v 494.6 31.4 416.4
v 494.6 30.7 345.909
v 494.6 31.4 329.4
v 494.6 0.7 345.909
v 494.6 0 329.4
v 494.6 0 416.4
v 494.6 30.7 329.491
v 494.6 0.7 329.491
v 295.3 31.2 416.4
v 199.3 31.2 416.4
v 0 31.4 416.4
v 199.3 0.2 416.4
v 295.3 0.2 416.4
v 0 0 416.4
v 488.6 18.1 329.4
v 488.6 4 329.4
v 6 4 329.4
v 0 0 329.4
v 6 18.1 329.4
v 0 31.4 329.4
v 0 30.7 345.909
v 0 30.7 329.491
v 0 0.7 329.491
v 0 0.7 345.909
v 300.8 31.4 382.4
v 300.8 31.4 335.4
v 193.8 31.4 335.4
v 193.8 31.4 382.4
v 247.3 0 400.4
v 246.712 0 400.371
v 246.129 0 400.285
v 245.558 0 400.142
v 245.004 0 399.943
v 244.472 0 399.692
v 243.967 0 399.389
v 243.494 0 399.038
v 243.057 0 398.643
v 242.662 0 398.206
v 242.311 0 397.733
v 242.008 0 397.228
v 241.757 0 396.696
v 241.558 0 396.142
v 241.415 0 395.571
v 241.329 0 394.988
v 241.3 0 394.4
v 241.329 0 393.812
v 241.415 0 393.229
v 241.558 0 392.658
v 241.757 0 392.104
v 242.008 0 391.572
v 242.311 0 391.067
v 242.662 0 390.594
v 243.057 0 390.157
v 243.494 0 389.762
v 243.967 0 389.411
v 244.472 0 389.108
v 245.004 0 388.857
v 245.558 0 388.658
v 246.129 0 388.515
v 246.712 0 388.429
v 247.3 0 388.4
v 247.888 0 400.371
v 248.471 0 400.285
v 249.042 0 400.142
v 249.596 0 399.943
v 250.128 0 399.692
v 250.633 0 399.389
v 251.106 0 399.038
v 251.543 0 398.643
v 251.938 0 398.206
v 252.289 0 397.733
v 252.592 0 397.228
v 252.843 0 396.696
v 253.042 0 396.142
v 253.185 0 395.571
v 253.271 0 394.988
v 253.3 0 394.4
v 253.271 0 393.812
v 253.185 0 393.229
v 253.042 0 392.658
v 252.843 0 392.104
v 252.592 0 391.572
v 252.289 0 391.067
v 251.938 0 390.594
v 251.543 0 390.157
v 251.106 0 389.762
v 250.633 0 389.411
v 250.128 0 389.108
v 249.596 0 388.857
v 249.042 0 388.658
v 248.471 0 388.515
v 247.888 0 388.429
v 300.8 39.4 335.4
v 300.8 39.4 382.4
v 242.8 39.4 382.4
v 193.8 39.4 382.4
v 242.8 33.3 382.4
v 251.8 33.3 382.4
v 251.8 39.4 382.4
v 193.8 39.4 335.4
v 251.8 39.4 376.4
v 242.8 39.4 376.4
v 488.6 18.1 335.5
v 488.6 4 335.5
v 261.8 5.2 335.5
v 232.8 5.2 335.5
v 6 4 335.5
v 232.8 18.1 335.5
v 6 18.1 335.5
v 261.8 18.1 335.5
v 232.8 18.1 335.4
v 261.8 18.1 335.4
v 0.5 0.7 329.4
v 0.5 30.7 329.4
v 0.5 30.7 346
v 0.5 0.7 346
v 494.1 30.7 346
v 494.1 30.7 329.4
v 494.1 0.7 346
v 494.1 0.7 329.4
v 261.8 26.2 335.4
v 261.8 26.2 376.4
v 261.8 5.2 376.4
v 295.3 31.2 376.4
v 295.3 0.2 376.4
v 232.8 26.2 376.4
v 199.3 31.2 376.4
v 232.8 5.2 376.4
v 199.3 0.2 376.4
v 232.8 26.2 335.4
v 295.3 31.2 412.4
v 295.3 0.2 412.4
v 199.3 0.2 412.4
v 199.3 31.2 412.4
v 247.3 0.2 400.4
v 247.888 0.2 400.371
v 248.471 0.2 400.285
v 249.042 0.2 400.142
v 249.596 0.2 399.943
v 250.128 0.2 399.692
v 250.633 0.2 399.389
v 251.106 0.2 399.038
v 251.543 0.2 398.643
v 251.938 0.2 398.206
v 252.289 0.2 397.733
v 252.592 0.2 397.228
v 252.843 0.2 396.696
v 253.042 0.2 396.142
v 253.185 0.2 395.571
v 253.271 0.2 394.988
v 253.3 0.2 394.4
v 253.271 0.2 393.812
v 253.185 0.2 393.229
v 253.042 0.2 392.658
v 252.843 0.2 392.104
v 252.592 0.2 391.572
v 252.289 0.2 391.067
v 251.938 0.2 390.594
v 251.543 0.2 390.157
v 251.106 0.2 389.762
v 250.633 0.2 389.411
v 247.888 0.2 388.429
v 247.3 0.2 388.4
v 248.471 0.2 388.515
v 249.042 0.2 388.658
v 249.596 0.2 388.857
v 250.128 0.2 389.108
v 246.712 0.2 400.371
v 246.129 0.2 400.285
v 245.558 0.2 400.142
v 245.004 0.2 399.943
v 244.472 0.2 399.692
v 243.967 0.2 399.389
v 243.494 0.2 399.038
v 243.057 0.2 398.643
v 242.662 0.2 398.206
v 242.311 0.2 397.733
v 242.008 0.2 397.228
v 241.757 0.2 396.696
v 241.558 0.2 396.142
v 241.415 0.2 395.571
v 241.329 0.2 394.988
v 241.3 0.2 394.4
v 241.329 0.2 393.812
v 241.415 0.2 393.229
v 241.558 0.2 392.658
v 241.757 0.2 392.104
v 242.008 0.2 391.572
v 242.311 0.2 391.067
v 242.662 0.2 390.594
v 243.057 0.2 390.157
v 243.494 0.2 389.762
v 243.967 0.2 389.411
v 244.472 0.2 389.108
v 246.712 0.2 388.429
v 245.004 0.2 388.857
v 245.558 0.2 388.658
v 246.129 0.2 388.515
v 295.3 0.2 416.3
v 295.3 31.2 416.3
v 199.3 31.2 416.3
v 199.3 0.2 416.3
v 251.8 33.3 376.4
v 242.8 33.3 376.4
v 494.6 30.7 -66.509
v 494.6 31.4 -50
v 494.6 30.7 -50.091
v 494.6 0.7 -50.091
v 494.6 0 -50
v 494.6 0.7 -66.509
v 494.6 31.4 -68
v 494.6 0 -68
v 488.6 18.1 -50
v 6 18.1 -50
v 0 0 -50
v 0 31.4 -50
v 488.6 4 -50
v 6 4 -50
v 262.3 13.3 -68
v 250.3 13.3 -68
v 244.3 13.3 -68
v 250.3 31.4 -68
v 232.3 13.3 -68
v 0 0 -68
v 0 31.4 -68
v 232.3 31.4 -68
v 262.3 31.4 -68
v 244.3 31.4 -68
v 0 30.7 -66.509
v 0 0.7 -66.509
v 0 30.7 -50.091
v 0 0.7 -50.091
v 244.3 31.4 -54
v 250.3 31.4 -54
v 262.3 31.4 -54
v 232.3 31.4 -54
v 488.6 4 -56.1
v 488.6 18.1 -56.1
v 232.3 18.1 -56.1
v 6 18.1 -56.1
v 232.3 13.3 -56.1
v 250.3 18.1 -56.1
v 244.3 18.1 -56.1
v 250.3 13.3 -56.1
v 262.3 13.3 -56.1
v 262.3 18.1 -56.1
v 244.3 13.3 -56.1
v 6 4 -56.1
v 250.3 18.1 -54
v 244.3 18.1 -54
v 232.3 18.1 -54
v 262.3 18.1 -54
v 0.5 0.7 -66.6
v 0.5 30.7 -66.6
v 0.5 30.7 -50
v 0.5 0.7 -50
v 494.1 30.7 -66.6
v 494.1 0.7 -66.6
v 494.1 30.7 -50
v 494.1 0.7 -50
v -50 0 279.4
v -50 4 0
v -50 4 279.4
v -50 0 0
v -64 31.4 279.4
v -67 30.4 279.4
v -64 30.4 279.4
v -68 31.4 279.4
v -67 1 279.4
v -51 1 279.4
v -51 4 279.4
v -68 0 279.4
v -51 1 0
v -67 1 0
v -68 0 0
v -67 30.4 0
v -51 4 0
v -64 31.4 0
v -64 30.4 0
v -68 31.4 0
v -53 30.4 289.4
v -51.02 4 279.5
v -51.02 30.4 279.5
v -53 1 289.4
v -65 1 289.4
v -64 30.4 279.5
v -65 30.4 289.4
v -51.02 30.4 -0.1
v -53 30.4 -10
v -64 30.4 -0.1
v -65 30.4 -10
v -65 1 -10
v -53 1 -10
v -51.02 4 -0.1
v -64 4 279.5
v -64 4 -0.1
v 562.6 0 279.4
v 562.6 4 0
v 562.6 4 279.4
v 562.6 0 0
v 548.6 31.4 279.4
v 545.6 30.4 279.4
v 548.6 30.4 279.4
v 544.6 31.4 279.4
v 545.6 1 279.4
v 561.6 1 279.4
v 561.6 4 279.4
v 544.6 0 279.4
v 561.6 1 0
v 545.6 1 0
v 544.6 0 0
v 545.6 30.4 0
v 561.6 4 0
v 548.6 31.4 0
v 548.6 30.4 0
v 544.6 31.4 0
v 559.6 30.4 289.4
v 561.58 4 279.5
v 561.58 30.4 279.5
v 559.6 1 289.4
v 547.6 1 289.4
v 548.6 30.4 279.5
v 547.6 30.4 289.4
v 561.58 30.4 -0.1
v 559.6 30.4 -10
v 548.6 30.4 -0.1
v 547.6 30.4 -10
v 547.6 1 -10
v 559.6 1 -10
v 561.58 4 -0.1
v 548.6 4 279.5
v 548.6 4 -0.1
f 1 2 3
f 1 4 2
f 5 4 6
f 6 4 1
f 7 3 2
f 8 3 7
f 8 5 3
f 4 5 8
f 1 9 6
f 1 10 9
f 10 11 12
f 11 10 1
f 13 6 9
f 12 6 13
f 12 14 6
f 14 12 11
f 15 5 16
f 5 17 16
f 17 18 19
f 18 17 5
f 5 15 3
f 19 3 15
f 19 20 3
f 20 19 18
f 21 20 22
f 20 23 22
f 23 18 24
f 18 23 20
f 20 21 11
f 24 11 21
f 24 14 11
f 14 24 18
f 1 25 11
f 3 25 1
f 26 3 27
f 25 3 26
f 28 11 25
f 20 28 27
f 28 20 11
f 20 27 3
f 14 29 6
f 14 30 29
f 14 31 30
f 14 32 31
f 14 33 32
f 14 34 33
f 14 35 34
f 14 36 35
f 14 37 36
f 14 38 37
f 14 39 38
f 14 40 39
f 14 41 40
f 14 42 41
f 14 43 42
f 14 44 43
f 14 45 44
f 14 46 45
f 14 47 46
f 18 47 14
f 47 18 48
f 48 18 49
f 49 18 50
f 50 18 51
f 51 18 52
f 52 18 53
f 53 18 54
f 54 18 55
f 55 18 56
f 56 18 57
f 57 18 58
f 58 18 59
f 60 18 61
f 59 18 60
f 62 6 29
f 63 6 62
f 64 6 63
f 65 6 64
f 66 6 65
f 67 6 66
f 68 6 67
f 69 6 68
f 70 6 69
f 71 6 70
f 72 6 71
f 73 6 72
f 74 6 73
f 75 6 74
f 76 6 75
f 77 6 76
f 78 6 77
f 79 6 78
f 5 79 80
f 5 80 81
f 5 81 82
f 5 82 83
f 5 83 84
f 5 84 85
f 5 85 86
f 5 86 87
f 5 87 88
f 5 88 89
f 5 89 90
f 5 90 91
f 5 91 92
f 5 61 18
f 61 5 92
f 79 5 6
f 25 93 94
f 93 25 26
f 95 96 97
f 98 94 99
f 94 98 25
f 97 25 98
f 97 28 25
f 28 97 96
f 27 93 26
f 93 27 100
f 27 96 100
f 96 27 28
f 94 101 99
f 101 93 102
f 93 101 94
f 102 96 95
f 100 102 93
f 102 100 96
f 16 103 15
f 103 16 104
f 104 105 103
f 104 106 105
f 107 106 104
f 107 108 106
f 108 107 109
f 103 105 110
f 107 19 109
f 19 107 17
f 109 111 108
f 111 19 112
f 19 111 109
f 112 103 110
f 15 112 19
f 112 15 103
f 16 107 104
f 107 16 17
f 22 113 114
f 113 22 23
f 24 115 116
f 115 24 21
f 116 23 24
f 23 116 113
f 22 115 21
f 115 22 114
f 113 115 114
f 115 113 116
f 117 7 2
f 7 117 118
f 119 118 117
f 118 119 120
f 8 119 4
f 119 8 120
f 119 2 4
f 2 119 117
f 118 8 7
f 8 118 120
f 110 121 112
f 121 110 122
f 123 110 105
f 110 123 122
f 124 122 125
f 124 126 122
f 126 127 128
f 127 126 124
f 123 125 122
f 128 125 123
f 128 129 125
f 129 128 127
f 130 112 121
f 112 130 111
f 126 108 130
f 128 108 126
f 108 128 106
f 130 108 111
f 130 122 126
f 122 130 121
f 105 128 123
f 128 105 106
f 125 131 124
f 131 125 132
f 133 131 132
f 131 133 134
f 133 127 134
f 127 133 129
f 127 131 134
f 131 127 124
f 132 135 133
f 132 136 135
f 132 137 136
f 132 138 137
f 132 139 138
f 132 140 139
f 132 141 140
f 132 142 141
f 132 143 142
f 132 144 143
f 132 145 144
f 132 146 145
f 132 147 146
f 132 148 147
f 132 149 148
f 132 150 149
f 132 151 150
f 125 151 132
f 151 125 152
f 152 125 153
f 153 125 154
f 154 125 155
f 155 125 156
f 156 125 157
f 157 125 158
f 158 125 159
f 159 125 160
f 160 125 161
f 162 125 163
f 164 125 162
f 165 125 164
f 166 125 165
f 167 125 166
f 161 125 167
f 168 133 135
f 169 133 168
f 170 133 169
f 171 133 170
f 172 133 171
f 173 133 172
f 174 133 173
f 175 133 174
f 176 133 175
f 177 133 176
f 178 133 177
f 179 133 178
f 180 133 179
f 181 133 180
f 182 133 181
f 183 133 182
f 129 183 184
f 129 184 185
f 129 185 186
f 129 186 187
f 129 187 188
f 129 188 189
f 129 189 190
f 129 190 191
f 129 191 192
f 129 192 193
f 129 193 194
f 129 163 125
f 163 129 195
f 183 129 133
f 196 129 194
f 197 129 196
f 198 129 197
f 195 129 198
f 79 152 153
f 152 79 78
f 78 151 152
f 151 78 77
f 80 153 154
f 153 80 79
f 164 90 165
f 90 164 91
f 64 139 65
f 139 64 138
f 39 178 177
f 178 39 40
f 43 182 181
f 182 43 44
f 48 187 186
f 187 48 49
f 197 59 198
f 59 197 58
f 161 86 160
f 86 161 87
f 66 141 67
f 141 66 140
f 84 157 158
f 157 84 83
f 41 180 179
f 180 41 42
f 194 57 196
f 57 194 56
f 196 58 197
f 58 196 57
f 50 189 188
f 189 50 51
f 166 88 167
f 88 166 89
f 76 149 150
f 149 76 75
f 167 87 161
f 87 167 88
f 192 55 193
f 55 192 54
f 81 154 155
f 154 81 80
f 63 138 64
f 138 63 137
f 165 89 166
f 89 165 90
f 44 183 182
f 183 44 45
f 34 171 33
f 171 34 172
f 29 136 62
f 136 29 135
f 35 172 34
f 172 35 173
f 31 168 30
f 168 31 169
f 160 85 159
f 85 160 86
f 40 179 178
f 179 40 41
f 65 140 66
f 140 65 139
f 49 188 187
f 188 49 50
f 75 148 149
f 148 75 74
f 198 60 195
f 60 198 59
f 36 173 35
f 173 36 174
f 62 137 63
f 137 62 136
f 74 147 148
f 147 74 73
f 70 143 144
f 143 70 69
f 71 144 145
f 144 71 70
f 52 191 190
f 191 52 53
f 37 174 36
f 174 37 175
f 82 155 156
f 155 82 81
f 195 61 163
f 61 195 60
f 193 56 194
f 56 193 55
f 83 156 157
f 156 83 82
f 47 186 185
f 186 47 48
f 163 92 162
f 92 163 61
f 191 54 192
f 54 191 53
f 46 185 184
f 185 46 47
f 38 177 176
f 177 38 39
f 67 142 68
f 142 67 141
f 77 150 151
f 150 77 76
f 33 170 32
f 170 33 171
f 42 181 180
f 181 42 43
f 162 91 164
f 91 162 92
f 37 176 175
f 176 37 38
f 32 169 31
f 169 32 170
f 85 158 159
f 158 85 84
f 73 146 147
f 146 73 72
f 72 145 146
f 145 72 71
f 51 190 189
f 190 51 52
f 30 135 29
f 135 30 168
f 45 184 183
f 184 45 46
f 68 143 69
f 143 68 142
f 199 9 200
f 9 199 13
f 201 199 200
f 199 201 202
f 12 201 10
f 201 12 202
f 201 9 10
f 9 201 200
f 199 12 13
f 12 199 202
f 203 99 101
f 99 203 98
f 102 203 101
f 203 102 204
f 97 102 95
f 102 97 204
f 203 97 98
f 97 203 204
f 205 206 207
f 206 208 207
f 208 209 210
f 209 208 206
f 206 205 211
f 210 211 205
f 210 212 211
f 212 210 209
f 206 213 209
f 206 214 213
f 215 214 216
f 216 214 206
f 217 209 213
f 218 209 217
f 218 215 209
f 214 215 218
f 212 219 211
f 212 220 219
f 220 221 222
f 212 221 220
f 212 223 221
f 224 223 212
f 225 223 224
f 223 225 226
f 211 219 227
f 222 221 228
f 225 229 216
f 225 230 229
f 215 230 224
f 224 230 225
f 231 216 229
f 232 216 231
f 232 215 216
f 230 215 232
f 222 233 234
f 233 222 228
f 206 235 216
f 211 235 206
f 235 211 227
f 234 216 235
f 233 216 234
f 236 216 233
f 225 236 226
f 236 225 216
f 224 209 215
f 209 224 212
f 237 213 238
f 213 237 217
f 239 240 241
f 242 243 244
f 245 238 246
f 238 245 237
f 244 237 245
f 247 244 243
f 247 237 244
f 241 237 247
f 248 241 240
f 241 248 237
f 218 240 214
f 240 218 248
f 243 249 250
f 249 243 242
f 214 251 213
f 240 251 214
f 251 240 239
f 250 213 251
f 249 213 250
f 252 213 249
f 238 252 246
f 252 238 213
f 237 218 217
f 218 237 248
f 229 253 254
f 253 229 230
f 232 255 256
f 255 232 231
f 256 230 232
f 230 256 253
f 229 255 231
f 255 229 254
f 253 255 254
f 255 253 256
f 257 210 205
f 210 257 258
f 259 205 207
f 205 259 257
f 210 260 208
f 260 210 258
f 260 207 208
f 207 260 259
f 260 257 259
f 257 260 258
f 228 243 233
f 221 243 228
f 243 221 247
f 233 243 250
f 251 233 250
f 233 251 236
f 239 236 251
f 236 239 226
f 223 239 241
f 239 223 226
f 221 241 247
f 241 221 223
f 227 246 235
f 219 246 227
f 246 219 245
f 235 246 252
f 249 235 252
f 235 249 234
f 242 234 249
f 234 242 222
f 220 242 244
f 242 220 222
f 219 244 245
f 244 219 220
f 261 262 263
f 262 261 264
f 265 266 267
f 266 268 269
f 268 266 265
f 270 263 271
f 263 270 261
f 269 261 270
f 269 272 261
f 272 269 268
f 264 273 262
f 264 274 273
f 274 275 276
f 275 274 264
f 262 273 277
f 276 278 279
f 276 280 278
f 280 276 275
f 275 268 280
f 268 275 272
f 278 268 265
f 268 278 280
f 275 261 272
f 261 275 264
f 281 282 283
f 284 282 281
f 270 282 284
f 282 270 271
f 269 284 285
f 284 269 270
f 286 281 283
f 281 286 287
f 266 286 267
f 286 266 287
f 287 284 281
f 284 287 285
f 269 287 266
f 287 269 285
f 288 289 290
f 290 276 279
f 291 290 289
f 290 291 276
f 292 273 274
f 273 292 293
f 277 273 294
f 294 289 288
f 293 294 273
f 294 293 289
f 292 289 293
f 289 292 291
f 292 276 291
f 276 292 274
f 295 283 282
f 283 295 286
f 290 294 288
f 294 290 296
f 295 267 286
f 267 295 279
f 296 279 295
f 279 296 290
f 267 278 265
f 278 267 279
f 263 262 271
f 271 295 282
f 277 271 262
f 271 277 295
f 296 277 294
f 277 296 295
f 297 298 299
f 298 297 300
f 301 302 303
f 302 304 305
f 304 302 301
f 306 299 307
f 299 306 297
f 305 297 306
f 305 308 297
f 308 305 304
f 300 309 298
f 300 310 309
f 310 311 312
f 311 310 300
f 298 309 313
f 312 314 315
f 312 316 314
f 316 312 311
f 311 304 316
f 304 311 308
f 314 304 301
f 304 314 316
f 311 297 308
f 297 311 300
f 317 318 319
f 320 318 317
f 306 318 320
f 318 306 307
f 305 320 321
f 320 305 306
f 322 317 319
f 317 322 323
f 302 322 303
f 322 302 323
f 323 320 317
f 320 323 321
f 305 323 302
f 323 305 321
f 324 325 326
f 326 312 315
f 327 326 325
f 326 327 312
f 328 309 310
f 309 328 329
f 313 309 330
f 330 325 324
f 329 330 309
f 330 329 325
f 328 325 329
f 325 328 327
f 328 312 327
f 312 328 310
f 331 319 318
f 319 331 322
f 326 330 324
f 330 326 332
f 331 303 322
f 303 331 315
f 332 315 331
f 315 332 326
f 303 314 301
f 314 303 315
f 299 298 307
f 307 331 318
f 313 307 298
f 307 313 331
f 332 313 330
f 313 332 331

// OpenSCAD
// ============================================================
//  SMART MIRROR FRAME  –  4-piece snap-together  (LANDSCAPE)
//
//  Monitor : 19" x 11" x 1"
//    MON_W = 482.6 mm  (long/width side, X axis)  ← was MON_H
//    MON_H = 279.4 mm  (short/height side, Z axis) ← was MON_W
//    MON_D =  25.4 mm  (depth, Y axis)
//
//  Landscape layout:
//    TOP & BOTTOM rails = LONG  (span MON_W + 2*WALL in X)
//    LEFT & RIGHT rails = SHORT (span MON_H in Z)
//
//  ── SNAP JOINT DESIGN ────────────────────────────────────────
//
//  Dovetail tabs on side rails protrude in ±Z.
//  Long rails (top/bottom) receive sockets cut into their X end faces.
//  Same joint geometry as portrait version — just longer rails.
//
//  ── CAMERA : Logitech Brio 105 / C505 (1080p USB) ───────────
//
//  Physical measurements (from product images):
//    Body  : ~95 mm wide × ~35 mm tall × ~30 mm deep
//            (horizontal pill-shaped housing)
//    Clip  : ~28 mm wide × ~40 mm tall
//    Lens aperture : ~10 mm diameter
//
//  Embedded in TOP long rail, centred horizontally.
//  Lens faces front (Y=0). Cable exits rear of bump-out.
//
//  ── WIRE MANAGEMENT ─────────────────────────────────────────
//
//  TOP rail:    camera USB cable channel through bump-out back wall
//  BOTTOM rail: monitor power + video cable channel (rear of rail)
//               sized for 2× cables side by side (HDMI + power)
//
//  PARTS:
//    "top"    long top rail with embedded Logitech camera
//    "bottom" long bottom rail with rear cable channel
//    "left"   short side rail (print 2)
//    "right"  alias for left
//    "all"    exploded view
// ============================================================

PART = "all";

// ----------------------------------------------------------
//  MONITOR  (landscape orientation)
// ----------------------------------------------------------
MON_W = 482.6;   // long dimension → now the horizontal width
MON_H = 279.4;   // short dimension → now the vertical height
MON_D =  25.4;

// ----------------------------------------------------------
//  FRAME PROFILE
// ----------------------------------------------------------
WALL   =  6;
LIP    =  8;
REVEAL =  4;
DEPTH  = MON_D + WALL;    // ≈ 31.4 mm

// ----------------------------------------------------------
//  DOVETAIL
// ----------------------------------------------------------
TAB_W  = 16;
TAB_H  = 10;
TAB_T  = DEPTH - 2;       // ≈ 29.4 mm
DRAFT  =  2;
CLEAR  =  0.3;

// ----------------------------------------------------------
//  CAMERA  (Logitech 1080p – landscape body)
//
//  The camera sits horizontally in the top rail.
//  Body is a horizontal pill: wide in X, shallow in Z.
//    CAM_BL = body length (X) = 95 mm
//    CAM_BW = body width  (Y, front-to-back) = 30 mm
//    CAM_BH = body height (Z) = 35 mm
//  Clip sits below the body (toward monitor):
//    CAM_CL = clip width (X) = 28 mm
//    CAM_CW = clip width (Y) = 20 mm
//    CAM_CH = clip height (Z) = 40 mm
// ----------------------------------------------------------
CAM_BL  = 95.0;    // body X (wide axis)
CAM_BW  = 30.0;    // body Y (depth into rail)
CAM_BH  = 35.0;    // body Z (height)
CAM_CL  = 28.0;    // clip/stand X
CAM_CW  = 20.0;    // clip/stand Y
CAM_CH  = 40.0;    // clip/stand Z (hangs down below body)
CAM_CLR =  0.5;    // pocket clearance all around
LENS_D  = 12.0;    // lens aperture diameter
USB_W   =  9.0;    // USB-A cable cross section (square approx)

// ----------------------------------------------------------
//  WIRE MANAGEMENT (bottom rail)
//
//  Two channels side by side on the rear face of the bottom
//  rail for monitor power + video cable routing.
//  Channels are open slots cut into the rear top edge.
// ----------------------------------------------------------
WIRE_W  = 12.0;    // individual channel width (fits HDMI + power)
WIRE_H  = 14.0;    // channel height
WIRE_SEP = 6.0;    // gap between the two channels

// ----------------------------------------------------------
//  RAIL HEIGHTS
// ----------------------------------------------------------
SHORT_H    = WALL + LIP + REVEAL;                 // 18 mm  (side rails)
TOP_RAIL_H = CAM_CH + CAM_BH + 2*WALL;           // clip below + body + walls
                                                   // = 40+35+12 = 87 mm

// Bump-out (rear protrusion to fully enclose camera body)
BUMP_D = 8;
BUMP_W = CAM_BL + 2*WALL;
BUMP_H = CAM_BH + 2*WALL;

// ============================================================
//  dovetail_tab
// ============================================================
module dovetail_tab() {
    linear_extrude(TAB_T, center=true)
    polygon([
        [ 0,      -(TAB_W/2)       ],
        [ 0,       (TAB_W/2)       ],
        [ TAB_H,   (TAB_W/2-DRAFT) ],
        [ TAB_H,  -(TAB_W/2-DRAFT) ]
    ]);
}

// ============================================================
//  dovetail_socket
// ============================================================
module dovetail_socket() {
    c = CLEAR;
    linear_extrude(TAB_T + 2*c, center=true)
    polygon([
        [-0.5,       -(TAB_W/2 + c)        ],
        [-0.5,        (TAB_W/2 + c)        ],
        [ TAB_H+0.5,  (TAB_W/2-DRAFT + c)  ],
        [ TAB_H+0.5, -(TAB_W/2-DRAFT + c)  ]
    ]);
}

// ============================================================
//  TOP RAIL  (long, camera embedded, USB cable channel)
//
//  X = 0 … MON_W + 2*WALL  (long axis, ~494.6 mm)
//  Y = 0 (front) … DEPTH (rear)
//  Z = 0 (bottom/inner) … TOP_RAIL_H (top/outer)
//
//  Camera centred at X = L/2.
//  Camera clip pocket starts at Z=WALL (above monitor slot wall).
//  Camera body pocket sits on top of clip pocket.
//  Lens port cut through front face (Y=0).
//  Bump-out extends rearward from Y=DEPTH for BUMP_D.
//  USB cable channel exits through bump-out back wall, centred on camera.
// ============================================================
module top_rail() {
    L      = MON_W + 2*WALL;
    sock_z = TAB_W/2 + CLEAR;   // 8.3 mm — socket centre from bottom

    cx = L / 2;   // camera centre X

    // Clip pocket (lower, narrower)
    cl_x0 = cx - (CAM_CL + 2*CAM_CLR) / 2;
    cl_y0 = (DEPTH - (CAM_CW + 2*CAM_CLR)) / 2;
    cl_z0 = WALL;

    // Body pocket (upper, wider, sits on top of clip)
    bo_x0 = cx - (CAM_BL + 2*CAM_CLR) / 2;
    bo_y0 = (DEPTH - (CAM_BW + 2*CAM_CLR)) / 2;
    bo_z0 = cl_z0 + CAM_CH + 2*CAM_CLR;

    // Lens port Z centre (middle of body pocket)
    lens_z = bo_z0 + (CAM_BH + 2*CAM_CLR) / 2;

    // Bump-out position
    bump_x0 = cx - BUMP_W / 2;
    bump_z0 = cl_z0;   // starts at same Z as clip pocket

    difference() {
        union() {
            // ── main rail body ─────────────────────────────
            cube([L, DEPTH, TOP_RAIL_H]);

            // ── rear bump-out housing ──────────────────────
            translate([bump_x0, DEPTH, bump_z0])
            cube([BUMP_W, BUMP_D, BUMP_H]);
        }

        // ── monitor slot – bottom face (Z=0) ───────────────
        translate([WALL, REVEAL, -0.1])
        cube([MON_W, LIP + WALL + 0.1, WALL + 0.2]);

        // ── dovetail socket – left end ──────────────────────
        translate([0, DEPTH/2, sock_z])
        rotate([-90, 180, 0])
        dovetail_socket();

        // ── dovetail socket – right end ─────────────────────
        translate([L, DEPTH/2, sock_z])
        rotate([90, 0, 0])
        dovetail_socket();

        // ── camera clip pocket ───────────────────────────────
        //    Clip hangs down into the rail from body-level down.
        translate([cl_x0, cl_y0, cl_z0])
        cube([CAM_CL + 2*CAM_CLR,
              CAM_CW + 2*CAM_CLR,
              CAM_CH + 2*CAM_CLR]);

        // ── camera body pocket ───────────────────────────────
        translate([bo_x0, bo_y0, bo_z0])
        cube([CAM_BL + 2*CAM_CLR,
              CAM_BW + 2*CAM_CLR,
              CAM_BH + 2*CAM_CLR]);

        // ── lens port – front face (Y=0) ────────────────────
        translate([cx, -0.1, lens_z])
        rotate([-90, 0, 0])
        cylinder(h=WALL + 1, r=LENS_D/2, $fn=64);

        // ── top access slot (drop-in installation) ───────────
        translate([bo_x0, bo_y0, TOP_RAIL_H - 0.1])
        cube([CAM_BL + 2*CAM_CLR,
              CAM_BW + 2*CAM_CLR,
              WALL + 0.2]);

        // ── USB cable channel – exits bump-out back wall ─────
        //    Centred in X; runs from body cavity through back wall.
        translate([(L - USB_W) / 2,
                   DEPTH + BUMP_D - WALL - 0.1,
                   bo_z0])
        cube([USB_W, WALL + 0.2, USB_W]);
    }
}

// ============================================================
//  BOTTOM RAIL  (long, wire management channels)
//
//  X = 0 … MON_W + 2*WALL
//  Y = 0 (front) … DEPTH (rear)
//  Z = 0 (inner/bottom) … SHORT_H (outer/top, 18 mm)
//
//  Monitor slot opens on top face (Z = SHORT_H).
//
//  Wire channels: two U-shaped slots cut into the rear face
//  (Y=DEPTH) and open at the bottom (Z=0).
//  Positioned near centre-bottom of the rail for tidy cable
//  drop to a Raspberry Pi / media player below the mirror.
//
//  The monitor's HDMI and power cables (visible in reference
//  photo) exit the bottom of the monitor and are routed down
//  through these channels.
// ============================================================
module bottom_rail() {
    L      = MON_W + 2*WALL;
    sock_z = SHORT_H - TAB_W/2 - CLEAR;   // 9.7 mm

    // Two channels, centred together on the rail length
    total_chan_w = 2*WIRE_W + WIRE_SEP;
    ch_x0 = L/2 - total_chan_w/2;   // left edge of left channel

    difference() {
        cube([L, DEPTH, SHORT_H]);

        // ── monitor slot – top face ─────────────────────────
        translate([WALL, REVEAL, SHORT_H - WALL - 0.1])
        cube([MON_W, LIP + WALL + 0.1, WALL + 0.2]);

        // ── dovetail socket – left end ──────────────────────
        translate([0, DEPTH/2, sock_z])
        rotate([-90, 180, 0])
        dovetail_socket();

        // ── dovetail socket – right end ─────────────────────
        translate([L, DEPTH/2, sock_z])
        rotate([90, 0, 0])
        dovetail_socket();

        // ── wire channel 1 (left / power cable) ────────────
        //    Open slot: exits through bottom (Z=0) and rear (Y=DEPTH).
        //    U-shaped groove in the rear portion of the rail.
        translate([ch_x0,
                   DEPTH - WIRE_W - WALL,
                   -0.1])
        cube([WIRE_W, WIRE_W + WALL + 0.1, WIRE_H + 0.1]);

        // ── wire channel 1 rear opening ─────────────────────
        translate([ch_x0,
                   DEPTH - WIRE_W - WALL - 0.1,
                   -0.1])
        cube([WIRE_W, WALL + 0.2, WIRE_H + 0.1]);

        // ── wire channel 2 (right / video cable) ────────────
        translate([ch_x0 + WIRE_W + WIRE_SEP,
                   DEPTH - WIRE_W - WALL,
                   -0.1])
        cube([WIRE_W, WIRE_W + WALL + 0.1, WIRE_H + 0.1]);

        // ── wire channel 2 rear opening ─────────────────────
        translate([ch_x0 + WIRE_W + WIRE_SEP,
                   DEPTH - WIRE_W - WALL - 0.1,
                   -0.1])
        cube([WIRE_W, WALL + 0.2, WIRE_H + 0.1]);
    }
}

// ============================================================
//  SIDE RAIL  (short – left or right, print 2)
//
//  X = width (0 … RW = WALL+LIP+REVEAL = 18 mm)
//  Y = depth (0 = front … DEPTH)
//  Z = height (0 … MON_H = 279.4 mm)  ← short dimension now
//
//  Monitor slot: interior face (X = RW)
//  Tabs:
//    Top end    (Z=MON_H): rotate([0,-90,-90])
//    Bottom end (Z=0):     rotate([0, 90,-90])
// ============================================================
module side_rail() {
    RW = WALL + LIP + REVEAL;

    difference() {
        union() {
            cube([RW, DEPTH, MON_H]);

            // tab – top end (+Z)
            translate([RW/2, DEPTH/2, MON_H])
            rotate([0, -90, -90])
            dovetail_tab();

            // tab – bottom end (-Z)
            translate([RW/2, DEPTH/2, 0])
            rotate([0, 90, -90])
            dovetail_tab();
        }

        // monitor slot – interior face
        translate([REVEAL, REVEAL, -0.1])
        cube([LIP + WALL + 0.1, DEPTH - REVEAL, MON_H + 0.2]);
    }
}

// ============================================================
//  EXPLODED VIEW
// ============================================================
module all_parts() {
    g  = 50;
    RW = WALL + LIP + REVEAL;

    // Top rail floated above
    color("SteelBlue")
    translate([0, 0, MON_H + g])
    top_rail();

    // Bottom rail below
    color("SteelBlue")
    translate([0, 0, -(SHORT_H + g)])
    bottom_rail();

    // Left side rail
    color("SlateGray")
    translate([-(RW + g), 0, 0])
    side_rail();

    // Right side rail
    color("SlateGray")
    translate([MON_W + 2*WALL + g, 0, 0])
    side_rail();
}

// ============================================================
//  RENDER
// ============================================================
if      (PART == "top")    top_rail();
else if (PART == "bottom") bottom_rail();
else if (PART == "left")   side_rail();
else if (PART == "right")  side_rail();
else                       all_parts();
